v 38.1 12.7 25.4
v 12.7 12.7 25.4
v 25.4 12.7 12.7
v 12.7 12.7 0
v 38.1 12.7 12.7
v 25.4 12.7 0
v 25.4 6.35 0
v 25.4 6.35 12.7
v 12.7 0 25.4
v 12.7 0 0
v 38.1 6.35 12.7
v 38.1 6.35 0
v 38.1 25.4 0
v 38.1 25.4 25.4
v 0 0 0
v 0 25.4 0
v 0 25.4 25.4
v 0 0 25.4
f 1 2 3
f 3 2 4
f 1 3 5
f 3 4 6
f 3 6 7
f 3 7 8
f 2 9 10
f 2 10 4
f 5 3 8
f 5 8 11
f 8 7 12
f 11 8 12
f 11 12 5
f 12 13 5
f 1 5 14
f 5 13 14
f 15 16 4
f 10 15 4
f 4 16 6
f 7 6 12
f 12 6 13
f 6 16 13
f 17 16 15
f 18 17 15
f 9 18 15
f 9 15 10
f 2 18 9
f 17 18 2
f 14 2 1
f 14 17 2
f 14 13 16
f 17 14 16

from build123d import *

# Parameters (mm, degrees)
F1_DEPTH = 25.4
F2_W     = 12.7
F2_H     = 12.7
F3_DEPTH = 6.35


with BuildPart() as f1:
    # F0 (on Top) → F1 (new body)
    with BuildSketch(Plane.XY):
        Polygon((0, 25.4), (0, 0), (12.7, 0), (12.7, 12.7), (38.1, 12.7), (38.1, 25.4), align=None)
    extrude(amount=F1_DEPTH)

    # F2 (on face) → F3 (join)
    with BuildSketch(Plane.XZ.offset(-12.7)):
        with Locations((31.75, 6.35)):
            Rectangle(F2_W, F2_H)
    extrude(amount=F3_DEPTH)


solid = f1.part
